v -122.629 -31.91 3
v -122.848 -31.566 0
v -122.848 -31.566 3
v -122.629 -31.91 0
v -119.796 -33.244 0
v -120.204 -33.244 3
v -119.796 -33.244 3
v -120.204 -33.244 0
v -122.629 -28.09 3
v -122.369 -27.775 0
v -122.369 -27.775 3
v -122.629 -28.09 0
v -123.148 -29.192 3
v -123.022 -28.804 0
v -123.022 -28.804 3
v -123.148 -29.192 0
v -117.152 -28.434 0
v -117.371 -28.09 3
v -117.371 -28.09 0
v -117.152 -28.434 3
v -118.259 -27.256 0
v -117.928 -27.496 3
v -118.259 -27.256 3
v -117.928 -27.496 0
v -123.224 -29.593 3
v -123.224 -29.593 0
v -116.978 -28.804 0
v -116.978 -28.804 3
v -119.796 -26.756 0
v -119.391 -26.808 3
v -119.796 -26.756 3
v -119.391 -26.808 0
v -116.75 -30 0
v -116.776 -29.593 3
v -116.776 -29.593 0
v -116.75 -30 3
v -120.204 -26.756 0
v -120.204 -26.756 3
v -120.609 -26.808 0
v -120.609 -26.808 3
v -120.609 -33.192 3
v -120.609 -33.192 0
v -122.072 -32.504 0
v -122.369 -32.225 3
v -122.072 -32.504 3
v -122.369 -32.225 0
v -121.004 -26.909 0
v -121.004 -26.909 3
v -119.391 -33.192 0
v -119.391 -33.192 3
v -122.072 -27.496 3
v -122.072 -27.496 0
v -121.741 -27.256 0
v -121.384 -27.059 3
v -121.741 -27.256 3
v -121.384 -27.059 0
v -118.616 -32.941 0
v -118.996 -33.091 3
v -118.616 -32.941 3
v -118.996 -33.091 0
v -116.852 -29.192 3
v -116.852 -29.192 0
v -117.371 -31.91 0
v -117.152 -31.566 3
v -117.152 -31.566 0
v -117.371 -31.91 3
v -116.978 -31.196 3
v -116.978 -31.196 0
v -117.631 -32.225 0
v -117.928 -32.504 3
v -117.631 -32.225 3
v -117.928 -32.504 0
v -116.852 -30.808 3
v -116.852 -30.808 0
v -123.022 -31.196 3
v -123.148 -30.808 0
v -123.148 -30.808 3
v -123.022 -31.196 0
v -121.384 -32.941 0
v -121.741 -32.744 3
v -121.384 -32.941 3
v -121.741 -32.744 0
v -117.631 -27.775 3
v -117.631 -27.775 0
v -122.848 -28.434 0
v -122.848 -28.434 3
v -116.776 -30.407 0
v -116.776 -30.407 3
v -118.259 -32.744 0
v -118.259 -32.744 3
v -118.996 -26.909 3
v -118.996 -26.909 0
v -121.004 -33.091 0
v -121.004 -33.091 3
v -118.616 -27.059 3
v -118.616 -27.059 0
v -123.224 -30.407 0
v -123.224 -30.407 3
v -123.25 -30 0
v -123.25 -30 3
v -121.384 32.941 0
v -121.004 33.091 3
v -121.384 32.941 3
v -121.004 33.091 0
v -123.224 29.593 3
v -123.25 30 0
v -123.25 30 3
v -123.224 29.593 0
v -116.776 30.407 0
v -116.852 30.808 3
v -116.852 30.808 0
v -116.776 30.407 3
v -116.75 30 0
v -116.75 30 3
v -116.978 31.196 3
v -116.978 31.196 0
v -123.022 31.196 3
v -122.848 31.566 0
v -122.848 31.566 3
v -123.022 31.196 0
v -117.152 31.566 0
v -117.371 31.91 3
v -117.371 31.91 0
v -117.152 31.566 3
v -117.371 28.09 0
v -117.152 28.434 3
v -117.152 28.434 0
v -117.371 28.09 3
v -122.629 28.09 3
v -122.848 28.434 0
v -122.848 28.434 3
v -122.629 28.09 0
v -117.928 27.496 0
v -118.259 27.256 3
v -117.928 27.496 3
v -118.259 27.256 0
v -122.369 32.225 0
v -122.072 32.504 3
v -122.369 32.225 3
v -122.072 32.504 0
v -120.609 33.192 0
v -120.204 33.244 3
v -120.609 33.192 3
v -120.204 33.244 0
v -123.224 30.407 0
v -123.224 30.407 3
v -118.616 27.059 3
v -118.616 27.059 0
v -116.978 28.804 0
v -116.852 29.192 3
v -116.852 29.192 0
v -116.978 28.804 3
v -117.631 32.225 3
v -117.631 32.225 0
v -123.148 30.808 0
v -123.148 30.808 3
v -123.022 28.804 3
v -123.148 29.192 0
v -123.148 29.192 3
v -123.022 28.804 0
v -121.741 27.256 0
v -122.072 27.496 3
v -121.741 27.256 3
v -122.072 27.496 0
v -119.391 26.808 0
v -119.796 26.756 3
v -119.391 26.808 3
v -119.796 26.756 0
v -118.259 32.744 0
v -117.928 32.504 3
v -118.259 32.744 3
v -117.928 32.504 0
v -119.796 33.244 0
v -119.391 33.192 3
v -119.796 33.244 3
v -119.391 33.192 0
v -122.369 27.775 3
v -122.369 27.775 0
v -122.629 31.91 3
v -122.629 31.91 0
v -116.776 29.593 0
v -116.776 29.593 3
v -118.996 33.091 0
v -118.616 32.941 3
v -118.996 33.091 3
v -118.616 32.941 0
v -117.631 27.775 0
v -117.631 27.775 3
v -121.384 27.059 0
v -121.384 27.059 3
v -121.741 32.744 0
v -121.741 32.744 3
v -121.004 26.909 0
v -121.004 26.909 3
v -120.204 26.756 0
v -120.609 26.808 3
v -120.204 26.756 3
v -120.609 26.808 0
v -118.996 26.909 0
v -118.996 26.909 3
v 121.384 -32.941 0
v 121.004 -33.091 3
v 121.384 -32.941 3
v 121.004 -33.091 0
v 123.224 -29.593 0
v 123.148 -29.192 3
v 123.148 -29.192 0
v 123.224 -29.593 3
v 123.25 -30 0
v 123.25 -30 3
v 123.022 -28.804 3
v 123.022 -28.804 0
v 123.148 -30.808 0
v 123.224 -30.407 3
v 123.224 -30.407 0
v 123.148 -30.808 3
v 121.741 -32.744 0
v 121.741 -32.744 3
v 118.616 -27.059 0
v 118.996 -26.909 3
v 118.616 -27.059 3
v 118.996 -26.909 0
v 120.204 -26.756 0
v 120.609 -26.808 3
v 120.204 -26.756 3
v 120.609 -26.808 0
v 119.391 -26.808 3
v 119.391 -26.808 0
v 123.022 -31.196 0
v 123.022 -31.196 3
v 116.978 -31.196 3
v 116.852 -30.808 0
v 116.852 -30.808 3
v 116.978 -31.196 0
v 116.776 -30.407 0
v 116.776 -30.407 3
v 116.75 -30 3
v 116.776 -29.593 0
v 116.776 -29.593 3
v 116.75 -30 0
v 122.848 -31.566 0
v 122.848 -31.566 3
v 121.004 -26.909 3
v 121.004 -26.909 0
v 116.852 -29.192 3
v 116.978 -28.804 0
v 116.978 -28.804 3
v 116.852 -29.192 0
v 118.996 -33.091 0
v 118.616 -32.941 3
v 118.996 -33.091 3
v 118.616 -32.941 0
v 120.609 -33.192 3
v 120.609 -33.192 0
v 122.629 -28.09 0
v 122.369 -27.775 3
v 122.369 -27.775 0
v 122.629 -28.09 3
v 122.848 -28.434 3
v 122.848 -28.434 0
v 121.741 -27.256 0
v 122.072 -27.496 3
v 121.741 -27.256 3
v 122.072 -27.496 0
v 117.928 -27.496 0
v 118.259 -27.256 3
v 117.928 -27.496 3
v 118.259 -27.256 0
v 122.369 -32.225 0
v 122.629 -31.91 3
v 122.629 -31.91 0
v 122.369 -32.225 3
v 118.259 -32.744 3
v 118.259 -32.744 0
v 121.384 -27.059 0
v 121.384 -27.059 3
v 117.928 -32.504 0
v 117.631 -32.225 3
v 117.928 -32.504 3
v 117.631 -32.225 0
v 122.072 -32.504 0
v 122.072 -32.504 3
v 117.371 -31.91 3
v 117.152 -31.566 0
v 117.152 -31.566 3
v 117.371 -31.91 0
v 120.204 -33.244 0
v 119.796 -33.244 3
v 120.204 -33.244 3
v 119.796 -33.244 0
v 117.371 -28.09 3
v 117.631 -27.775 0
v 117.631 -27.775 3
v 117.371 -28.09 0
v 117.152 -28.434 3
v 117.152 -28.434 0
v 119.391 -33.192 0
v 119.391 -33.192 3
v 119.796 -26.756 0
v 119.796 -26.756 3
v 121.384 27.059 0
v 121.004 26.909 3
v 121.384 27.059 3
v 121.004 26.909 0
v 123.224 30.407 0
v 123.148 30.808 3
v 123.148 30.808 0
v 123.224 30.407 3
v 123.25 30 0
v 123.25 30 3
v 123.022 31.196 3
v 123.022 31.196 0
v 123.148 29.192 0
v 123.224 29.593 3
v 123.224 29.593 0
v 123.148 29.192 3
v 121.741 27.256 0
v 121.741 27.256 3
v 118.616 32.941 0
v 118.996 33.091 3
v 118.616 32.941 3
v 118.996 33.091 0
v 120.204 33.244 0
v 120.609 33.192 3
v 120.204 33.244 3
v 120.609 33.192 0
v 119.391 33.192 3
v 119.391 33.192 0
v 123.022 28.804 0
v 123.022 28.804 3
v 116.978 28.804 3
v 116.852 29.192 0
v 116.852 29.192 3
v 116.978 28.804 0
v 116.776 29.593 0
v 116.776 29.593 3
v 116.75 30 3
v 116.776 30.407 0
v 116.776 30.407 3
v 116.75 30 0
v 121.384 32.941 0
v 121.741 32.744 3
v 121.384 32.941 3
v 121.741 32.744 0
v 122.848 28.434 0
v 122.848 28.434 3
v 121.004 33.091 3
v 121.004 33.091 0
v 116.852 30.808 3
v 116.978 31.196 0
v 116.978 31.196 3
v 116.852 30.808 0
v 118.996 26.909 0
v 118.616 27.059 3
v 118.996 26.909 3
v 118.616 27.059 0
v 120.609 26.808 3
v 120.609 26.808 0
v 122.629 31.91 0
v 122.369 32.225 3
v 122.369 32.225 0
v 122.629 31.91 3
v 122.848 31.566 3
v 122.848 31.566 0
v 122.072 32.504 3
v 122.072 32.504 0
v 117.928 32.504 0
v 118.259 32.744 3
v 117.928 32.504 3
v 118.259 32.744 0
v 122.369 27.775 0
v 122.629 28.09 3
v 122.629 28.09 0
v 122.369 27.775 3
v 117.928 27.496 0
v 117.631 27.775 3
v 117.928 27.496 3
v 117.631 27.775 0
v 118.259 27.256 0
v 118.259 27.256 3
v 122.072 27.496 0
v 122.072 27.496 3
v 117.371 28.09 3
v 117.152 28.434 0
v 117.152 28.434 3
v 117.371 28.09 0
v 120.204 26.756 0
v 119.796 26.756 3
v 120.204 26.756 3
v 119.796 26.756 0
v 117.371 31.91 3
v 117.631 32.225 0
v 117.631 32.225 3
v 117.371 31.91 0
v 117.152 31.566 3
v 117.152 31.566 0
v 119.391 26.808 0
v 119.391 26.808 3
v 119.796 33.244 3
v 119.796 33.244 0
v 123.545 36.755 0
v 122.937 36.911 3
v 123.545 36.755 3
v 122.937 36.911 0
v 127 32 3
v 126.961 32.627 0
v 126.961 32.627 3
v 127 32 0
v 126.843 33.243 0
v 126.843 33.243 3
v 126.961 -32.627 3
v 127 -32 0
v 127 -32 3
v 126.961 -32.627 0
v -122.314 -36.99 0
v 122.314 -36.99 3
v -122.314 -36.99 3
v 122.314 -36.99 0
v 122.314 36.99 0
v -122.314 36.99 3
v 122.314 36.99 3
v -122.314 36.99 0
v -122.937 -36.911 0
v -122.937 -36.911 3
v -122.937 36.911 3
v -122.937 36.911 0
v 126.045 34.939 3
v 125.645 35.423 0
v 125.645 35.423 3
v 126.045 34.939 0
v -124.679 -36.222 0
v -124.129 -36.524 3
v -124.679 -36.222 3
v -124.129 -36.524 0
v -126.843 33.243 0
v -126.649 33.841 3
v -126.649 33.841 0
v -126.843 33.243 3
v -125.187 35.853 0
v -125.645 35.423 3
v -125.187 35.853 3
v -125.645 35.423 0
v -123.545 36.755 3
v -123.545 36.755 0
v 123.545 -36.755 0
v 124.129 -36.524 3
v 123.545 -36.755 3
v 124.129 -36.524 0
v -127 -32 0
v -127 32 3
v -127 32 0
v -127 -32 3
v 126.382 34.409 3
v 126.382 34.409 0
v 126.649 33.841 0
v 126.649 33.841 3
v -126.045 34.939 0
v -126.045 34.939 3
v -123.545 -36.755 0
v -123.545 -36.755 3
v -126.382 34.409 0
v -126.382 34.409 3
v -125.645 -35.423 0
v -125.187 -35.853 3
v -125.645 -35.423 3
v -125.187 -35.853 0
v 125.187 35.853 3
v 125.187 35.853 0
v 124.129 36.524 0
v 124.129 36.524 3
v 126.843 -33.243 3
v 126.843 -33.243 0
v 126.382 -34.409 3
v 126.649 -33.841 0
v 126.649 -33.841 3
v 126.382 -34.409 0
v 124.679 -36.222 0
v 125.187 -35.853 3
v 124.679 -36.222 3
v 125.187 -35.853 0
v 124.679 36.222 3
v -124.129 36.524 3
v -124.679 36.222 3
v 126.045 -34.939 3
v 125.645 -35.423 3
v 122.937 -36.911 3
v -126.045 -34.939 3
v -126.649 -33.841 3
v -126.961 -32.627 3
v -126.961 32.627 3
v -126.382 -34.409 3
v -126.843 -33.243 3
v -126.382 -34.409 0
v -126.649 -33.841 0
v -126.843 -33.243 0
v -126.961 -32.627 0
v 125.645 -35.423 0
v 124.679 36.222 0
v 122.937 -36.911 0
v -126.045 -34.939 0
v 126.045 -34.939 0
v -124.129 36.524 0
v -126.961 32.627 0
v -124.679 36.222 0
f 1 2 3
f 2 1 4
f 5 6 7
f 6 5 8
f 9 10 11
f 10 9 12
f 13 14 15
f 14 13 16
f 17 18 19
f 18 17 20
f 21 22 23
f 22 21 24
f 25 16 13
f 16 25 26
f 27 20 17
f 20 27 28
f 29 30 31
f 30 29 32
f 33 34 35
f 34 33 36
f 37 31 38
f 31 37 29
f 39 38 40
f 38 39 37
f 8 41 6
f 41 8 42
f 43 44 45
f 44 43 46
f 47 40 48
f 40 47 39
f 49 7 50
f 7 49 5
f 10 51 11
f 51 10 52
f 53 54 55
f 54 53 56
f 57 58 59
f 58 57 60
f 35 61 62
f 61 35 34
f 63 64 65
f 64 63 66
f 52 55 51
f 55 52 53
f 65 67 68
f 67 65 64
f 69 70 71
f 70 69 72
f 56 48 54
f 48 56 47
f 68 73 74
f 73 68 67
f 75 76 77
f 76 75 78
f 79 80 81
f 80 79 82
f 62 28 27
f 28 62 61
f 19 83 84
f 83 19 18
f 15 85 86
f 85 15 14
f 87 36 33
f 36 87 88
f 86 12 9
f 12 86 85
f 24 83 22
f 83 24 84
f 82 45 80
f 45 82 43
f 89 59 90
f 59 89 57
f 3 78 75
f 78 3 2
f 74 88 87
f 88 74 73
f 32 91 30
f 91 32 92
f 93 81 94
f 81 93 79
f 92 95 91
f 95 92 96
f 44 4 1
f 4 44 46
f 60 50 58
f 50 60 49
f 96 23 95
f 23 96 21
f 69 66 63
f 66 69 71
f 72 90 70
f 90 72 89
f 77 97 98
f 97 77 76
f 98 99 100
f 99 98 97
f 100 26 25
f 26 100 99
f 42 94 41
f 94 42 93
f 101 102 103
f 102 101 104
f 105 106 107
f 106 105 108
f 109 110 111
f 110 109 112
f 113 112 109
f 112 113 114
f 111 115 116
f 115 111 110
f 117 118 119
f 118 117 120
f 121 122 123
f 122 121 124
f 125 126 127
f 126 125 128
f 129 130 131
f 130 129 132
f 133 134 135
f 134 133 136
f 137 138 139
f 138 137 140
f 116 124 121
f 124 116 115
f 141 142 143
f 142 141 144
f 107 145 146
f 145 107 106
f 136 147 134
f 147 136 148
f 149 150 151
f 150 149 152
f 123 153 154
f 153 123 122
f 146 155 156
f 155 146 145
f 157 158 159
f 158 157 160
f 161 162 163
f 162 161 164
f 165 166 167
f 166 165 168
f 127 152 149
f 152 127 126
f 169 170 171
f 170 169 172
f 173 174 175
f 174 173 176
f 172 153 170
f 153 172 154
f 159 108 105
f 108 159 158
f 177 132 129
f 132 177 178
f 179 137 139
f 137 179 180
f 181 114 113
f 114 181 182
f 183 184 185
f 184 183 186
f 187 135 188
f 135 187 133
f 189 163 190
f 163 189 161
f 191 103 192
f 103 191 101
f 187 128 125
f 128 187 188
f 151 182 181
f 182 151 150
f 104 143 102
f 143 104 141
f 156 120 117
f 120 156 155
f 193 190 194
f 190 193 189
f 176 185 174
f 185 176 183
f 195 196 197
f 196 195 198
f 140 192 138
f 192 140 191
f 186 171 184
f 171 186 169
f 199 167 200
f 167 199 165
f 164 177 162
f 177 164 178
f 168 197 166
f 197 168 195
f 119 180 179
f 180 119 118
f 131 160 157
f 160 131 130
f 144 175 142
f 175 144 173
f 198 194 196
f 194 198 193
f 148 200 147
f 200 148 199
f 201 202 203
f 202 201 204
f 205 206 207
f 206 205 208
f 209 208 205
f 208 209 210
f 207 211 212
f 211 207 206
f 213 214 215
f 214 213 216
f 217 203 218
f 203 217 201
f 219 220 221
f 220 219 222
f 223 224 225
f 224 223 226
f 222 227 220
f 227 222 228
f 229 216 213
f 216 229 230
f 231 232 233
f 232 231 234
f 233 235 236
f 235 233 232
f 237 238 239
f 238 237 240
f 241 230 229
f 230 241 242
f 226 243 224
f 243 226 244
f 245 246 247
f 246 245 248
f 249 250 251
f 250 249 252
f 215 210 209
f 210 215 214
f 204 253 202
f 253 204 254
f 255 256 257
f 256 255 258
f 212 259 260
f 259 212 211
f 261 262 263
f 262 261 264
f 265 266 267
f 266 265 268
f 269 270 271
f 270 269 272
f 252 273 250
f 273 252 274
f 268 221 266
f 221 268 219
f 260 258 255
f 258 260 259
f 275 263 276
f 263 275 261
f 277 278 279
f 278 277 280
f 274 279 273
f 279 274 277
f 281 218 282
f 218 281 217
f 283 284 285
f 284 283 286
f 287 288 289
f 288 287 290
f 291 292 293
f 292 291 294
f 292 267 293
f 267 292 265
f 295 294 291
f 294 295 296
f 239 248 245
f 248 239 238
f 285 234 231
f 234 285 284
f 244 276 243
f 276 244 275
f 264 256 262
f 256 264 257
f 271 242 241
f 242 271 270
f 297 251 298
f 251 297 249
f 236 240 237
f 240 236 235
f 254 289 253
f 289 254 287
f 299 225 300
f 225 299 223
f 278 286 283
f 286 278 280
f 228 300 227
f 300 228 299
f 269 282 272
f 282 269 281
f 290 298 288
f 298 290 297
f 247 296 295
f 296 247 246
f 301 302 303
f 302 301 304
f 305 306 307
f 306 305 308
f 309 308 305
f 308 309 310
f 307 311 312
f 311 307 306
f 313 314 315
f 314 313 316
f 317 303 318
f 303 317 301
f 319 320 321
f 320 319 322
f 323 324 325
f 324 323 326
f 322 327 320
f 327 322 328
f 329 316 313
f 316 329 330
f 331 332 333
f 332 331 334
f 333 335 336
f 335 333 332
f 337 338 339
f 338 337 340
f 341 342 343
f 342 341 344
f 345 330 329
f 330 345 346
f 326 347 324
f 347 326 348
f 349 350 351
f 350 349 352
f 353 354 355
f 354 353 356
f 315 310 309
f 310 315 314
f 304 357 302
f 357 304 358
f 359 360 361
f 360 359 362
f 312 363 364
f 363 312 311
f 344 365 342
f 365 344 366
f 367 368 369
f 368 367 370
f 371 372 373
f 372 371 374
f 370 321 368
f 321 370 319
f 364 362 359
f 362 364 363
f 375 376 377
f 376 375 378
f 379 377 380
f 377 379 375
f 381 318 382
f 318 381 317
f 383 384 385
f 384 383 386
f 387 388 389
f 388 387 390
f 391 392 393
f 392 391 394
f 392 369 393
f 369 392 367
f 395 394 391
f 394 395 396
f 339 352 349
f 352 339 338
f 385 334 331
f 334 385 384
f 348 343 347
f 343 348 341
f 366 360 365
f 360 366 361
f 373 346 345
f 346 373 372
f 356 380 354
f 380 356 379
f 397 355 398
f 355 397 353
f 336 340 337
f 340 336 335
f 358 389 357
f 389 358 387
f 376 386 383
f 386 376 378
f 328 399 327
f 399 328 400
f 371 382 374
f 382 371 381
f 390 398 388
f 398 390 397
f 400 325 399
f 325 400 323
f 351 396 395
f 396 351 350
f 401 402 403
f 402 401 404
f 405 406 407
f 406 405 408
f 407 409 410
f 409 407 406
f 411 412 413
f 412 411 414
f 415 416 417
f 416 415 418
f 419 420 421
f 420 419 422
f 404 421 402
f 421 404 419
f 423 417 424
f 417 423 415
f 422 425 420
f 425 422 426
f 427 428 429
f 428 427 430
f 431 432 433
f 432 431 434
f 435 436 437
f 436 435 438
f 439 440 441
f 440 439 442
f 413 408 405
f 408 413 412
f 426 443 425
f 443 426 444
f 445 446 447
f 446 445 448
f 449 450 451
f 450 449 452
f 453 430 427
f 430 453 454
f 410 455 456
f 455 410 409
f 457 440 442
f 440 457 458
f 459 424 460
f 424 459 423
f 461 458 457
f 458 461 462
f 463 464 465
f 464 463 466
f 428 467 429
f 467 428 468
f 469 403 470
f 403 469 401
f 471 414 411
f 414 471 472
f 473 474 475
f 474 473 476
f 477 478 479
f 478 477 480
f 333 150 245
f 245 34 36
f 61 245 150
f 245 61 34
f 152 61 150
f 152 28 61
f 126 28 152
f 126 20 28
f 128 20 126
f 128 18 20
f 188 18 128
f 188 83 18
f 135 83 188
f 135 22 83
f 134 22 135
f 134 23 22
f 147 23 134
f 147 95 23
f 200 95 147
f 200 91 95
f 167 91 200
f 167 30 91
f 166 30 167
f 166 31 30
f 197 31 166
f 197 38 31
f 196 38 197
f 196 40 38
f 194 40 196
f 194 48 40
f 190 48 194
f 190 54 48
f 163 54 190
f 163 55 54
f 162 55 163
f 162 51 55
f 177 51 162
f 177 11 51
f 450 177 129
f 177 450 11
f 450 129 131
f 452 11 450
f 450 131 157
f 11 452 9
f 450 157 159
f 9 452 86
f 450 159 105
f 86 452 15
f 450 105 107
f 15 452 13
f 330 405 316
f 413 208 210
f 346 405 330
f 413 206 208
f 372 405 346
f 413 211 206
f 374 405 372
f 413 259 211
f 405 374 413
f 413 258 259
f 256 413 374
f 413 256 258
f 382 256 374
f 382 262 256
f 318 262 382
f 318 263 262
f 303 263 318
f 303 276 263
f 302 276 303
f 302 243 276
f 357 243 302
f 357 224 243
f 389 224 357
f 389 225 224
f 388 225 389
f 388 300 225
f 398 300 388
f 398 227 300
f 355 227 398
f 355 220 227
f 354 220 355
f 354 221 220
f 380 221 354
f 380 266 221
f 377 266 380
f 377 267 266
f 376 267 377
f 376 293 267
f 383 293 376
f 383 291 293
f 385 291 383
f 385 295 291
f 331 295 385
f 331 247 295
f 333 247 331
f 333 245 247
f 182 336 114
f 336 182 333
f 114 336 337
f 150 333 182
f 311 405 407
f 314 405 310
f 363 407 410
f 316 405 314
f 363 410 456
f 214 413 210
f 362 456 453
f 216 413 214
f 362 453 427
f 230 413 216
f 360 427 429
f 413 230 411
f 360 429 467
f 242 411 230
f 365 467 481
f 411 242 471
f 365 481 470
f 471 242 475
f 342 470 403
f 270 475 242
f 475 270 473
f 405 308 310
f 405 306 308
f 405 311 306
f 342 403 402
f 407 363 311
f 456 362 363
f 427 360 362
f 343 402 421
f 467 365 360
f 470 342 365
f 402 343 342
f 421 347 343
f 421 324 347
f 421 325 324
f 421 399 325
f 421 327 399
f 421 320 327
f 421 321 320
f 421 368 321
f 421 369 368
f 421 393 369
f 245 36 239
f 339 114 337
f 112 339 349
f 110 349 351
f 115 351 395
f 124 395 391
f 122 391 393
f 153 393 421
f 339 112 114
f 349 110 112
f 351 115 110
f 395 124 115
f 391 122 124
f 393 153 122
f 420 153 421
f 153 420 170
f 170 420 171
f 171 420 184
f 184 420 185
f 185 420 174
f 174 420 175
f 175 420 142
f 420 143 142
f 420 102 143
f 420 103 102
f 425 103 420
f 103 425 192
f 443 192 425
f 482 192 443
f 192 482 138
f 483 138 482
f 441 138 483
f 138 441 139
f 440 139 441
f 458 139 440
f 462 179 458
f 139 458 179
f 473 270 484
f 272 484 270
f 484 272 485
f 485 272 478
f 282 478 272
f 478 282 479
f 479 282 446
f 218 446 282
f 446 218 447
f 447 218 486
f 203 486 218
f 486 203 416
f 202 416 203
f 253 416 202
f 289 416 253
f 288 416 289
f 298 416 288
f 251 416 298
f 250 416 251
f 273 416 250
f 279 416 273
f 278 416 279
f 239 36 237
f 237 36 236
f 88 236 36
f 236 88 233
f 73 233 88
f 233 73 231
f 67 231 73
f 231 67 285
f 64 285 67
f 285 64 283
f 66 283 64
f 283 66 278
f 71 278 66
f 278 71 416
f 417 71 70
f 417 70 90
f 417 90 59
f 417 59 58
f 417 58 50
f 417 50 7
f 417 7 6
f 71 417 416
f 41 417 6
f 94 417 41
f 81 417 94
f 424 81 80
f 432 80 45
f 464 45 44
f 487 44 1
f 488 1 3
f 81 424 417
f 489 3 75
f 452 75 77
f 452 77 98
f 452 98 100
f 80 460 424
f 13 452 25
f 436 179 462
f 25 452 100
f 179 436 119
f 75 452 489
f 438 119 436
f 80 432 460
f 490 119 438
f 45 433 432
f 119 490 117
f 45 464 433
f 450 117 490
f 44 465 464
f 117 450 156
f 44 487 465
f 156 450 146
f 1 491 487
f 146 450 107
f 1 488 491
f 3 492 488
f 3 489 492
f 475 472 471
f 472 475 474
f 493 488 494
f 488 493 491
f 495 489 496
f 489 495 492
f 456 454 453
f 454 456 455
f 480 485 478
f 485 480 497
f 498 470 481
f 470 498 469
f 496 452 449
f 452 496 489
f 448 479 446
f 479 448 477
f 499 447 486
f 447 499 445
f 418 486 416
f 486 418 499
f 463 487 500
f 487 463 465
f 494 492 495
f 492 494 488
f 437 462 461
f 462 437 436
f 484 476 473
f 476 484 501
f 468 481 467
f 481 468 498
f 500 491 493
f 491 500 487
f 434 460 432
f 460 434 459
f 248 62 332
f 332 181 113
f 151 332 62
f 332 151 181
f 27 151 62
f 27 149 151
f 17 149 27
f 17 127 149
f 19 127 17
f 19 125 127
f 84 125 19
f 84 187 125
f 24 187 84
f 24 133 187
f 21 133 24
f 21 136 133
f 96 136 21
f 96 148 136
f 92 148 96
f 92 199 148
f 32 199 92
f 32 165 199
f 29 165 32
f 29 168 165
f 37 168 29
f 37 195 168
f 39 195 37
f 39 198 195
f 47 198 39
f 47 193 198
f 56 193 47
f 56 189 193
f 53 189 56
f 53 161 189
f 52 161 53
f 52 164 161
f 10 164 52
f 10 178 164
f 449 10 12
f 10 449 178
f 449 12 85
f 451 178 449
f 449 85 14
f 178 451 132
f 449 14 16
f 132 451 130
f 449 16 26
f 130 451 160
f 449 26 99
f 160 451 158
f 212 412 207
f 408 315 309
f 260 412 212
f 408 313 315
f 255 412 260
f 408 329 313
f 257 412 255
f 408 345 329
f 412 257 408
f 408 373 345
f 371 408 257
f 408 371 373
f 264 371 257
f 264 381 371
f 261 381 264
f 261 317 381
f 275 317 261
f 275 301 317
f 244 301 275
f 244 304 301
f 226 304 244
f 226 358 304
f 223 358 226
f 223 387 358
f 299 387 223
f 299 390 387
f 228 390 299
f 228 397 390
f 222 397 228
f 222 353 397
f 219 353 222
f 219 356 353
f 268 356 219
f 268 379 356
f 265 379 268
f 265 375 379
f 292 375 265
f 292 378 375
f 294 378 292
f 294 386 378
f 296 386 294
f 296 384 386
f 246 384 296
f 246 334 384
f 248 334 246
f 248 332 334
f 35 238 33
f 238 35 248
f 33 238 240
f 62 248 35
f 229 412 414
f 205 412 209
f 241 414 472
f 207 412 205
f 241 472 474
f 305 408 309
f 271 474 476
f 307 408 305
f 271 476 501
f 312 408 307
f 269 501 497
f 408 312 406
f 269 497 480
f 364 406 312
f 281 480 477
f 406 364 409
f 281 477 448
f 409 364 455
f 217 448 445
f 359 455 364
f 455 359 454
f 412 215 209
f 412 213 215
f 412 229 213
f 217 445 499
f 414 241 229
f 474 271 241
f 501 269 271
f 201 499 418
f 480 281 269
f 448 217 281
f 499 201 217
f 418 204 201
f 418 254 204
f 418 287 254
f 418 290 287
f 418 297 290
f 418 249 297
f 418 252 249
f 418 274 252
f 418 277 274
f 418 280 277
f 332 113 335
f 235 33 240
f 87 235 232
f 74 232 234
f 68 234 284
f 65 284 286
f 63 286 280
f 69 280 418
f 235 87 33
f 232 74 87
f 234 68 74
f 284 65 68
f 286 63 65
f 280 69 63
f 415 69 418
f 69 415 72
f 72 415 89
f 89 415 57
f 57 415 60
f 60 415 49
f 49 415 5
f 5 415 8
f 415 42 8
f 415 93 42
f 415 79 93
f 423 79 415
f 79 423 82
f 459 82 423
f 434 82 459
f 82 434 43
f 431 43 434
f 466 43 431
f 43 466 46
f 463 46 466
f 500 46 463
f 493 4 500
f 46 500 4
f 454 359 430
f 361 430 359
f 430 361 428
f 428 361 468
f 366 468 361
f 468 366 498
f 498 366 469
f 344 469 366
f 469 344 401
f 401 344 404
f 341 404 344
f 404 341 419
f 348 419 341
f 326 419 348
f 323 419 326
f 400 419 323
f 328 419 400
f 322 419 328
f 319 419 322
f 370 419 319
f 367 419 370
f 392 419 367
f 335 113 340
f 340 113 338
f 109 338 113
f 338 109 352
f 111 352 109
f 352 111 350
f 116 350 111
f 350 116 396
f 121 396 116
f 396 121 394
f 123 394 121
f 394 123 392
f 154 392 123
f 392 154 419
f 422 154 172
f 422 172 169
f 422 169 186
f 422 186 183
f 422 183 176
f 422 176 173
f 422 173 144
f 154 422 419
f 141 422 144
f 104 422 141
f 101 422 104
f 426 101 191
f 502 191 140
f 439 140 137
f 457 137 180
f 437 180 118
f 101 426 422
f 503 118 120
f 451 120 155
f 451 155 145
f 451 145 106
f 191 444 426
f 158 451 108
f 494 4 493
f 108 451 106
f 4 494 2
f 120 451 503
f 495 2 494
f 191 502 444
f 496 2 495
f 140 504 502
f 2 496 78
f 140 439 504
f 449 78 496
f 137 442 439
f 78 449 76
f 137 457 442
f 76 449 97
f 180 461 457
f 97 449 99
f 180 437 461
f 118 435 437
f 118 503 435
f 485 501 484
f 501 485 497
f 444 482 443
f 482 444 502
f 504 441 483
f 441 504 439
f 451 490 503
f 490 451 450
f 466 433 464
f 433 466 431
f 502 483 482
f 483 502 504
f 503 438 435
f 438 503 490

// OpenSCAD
$fn = 50;


difference() {
	union() {
		hull() {
			translate(v = [-122.0000000000, 32.0000000000, 0]) {
				cylinder(h = 3, r = 5);
			}
			translate(v = [122.0000000000, 32.0000000000, 0]) {
				cylinder(h = 3, r = 5);
			}
			translate(v = [-122.0000000000, -32.0000000000, 0]) {
				cylinder(h = 3, r = 5);
			}
			translate(v = [122.0000000000, -32.0000000000, 0]) {
				cylinder(h = 3, r = 5);
			}
		}
	}
	union() {
		translate(v = [-120.0000000000, -30.0000000000, -100.0000000000]) {
			cylinder(h = 200, r = 3.2500000000);
		}
		translate(v = [-120.0000000000, 30.0000000000, -100.0000000000]) {
			cylinder(h = 200, r = 3.2500000000);
		}
		translate(v = [120.0000000000, -30.0000000000, -100.0000000000]) {
			cylinder(h = 200, r = 3.2500000000);
		}
		translate(v = [120.0000000000, 30.0000000000, -100.0000000000]) {
			cylinder(h = 200, r = 3.2500000000);
		}
	}
}
